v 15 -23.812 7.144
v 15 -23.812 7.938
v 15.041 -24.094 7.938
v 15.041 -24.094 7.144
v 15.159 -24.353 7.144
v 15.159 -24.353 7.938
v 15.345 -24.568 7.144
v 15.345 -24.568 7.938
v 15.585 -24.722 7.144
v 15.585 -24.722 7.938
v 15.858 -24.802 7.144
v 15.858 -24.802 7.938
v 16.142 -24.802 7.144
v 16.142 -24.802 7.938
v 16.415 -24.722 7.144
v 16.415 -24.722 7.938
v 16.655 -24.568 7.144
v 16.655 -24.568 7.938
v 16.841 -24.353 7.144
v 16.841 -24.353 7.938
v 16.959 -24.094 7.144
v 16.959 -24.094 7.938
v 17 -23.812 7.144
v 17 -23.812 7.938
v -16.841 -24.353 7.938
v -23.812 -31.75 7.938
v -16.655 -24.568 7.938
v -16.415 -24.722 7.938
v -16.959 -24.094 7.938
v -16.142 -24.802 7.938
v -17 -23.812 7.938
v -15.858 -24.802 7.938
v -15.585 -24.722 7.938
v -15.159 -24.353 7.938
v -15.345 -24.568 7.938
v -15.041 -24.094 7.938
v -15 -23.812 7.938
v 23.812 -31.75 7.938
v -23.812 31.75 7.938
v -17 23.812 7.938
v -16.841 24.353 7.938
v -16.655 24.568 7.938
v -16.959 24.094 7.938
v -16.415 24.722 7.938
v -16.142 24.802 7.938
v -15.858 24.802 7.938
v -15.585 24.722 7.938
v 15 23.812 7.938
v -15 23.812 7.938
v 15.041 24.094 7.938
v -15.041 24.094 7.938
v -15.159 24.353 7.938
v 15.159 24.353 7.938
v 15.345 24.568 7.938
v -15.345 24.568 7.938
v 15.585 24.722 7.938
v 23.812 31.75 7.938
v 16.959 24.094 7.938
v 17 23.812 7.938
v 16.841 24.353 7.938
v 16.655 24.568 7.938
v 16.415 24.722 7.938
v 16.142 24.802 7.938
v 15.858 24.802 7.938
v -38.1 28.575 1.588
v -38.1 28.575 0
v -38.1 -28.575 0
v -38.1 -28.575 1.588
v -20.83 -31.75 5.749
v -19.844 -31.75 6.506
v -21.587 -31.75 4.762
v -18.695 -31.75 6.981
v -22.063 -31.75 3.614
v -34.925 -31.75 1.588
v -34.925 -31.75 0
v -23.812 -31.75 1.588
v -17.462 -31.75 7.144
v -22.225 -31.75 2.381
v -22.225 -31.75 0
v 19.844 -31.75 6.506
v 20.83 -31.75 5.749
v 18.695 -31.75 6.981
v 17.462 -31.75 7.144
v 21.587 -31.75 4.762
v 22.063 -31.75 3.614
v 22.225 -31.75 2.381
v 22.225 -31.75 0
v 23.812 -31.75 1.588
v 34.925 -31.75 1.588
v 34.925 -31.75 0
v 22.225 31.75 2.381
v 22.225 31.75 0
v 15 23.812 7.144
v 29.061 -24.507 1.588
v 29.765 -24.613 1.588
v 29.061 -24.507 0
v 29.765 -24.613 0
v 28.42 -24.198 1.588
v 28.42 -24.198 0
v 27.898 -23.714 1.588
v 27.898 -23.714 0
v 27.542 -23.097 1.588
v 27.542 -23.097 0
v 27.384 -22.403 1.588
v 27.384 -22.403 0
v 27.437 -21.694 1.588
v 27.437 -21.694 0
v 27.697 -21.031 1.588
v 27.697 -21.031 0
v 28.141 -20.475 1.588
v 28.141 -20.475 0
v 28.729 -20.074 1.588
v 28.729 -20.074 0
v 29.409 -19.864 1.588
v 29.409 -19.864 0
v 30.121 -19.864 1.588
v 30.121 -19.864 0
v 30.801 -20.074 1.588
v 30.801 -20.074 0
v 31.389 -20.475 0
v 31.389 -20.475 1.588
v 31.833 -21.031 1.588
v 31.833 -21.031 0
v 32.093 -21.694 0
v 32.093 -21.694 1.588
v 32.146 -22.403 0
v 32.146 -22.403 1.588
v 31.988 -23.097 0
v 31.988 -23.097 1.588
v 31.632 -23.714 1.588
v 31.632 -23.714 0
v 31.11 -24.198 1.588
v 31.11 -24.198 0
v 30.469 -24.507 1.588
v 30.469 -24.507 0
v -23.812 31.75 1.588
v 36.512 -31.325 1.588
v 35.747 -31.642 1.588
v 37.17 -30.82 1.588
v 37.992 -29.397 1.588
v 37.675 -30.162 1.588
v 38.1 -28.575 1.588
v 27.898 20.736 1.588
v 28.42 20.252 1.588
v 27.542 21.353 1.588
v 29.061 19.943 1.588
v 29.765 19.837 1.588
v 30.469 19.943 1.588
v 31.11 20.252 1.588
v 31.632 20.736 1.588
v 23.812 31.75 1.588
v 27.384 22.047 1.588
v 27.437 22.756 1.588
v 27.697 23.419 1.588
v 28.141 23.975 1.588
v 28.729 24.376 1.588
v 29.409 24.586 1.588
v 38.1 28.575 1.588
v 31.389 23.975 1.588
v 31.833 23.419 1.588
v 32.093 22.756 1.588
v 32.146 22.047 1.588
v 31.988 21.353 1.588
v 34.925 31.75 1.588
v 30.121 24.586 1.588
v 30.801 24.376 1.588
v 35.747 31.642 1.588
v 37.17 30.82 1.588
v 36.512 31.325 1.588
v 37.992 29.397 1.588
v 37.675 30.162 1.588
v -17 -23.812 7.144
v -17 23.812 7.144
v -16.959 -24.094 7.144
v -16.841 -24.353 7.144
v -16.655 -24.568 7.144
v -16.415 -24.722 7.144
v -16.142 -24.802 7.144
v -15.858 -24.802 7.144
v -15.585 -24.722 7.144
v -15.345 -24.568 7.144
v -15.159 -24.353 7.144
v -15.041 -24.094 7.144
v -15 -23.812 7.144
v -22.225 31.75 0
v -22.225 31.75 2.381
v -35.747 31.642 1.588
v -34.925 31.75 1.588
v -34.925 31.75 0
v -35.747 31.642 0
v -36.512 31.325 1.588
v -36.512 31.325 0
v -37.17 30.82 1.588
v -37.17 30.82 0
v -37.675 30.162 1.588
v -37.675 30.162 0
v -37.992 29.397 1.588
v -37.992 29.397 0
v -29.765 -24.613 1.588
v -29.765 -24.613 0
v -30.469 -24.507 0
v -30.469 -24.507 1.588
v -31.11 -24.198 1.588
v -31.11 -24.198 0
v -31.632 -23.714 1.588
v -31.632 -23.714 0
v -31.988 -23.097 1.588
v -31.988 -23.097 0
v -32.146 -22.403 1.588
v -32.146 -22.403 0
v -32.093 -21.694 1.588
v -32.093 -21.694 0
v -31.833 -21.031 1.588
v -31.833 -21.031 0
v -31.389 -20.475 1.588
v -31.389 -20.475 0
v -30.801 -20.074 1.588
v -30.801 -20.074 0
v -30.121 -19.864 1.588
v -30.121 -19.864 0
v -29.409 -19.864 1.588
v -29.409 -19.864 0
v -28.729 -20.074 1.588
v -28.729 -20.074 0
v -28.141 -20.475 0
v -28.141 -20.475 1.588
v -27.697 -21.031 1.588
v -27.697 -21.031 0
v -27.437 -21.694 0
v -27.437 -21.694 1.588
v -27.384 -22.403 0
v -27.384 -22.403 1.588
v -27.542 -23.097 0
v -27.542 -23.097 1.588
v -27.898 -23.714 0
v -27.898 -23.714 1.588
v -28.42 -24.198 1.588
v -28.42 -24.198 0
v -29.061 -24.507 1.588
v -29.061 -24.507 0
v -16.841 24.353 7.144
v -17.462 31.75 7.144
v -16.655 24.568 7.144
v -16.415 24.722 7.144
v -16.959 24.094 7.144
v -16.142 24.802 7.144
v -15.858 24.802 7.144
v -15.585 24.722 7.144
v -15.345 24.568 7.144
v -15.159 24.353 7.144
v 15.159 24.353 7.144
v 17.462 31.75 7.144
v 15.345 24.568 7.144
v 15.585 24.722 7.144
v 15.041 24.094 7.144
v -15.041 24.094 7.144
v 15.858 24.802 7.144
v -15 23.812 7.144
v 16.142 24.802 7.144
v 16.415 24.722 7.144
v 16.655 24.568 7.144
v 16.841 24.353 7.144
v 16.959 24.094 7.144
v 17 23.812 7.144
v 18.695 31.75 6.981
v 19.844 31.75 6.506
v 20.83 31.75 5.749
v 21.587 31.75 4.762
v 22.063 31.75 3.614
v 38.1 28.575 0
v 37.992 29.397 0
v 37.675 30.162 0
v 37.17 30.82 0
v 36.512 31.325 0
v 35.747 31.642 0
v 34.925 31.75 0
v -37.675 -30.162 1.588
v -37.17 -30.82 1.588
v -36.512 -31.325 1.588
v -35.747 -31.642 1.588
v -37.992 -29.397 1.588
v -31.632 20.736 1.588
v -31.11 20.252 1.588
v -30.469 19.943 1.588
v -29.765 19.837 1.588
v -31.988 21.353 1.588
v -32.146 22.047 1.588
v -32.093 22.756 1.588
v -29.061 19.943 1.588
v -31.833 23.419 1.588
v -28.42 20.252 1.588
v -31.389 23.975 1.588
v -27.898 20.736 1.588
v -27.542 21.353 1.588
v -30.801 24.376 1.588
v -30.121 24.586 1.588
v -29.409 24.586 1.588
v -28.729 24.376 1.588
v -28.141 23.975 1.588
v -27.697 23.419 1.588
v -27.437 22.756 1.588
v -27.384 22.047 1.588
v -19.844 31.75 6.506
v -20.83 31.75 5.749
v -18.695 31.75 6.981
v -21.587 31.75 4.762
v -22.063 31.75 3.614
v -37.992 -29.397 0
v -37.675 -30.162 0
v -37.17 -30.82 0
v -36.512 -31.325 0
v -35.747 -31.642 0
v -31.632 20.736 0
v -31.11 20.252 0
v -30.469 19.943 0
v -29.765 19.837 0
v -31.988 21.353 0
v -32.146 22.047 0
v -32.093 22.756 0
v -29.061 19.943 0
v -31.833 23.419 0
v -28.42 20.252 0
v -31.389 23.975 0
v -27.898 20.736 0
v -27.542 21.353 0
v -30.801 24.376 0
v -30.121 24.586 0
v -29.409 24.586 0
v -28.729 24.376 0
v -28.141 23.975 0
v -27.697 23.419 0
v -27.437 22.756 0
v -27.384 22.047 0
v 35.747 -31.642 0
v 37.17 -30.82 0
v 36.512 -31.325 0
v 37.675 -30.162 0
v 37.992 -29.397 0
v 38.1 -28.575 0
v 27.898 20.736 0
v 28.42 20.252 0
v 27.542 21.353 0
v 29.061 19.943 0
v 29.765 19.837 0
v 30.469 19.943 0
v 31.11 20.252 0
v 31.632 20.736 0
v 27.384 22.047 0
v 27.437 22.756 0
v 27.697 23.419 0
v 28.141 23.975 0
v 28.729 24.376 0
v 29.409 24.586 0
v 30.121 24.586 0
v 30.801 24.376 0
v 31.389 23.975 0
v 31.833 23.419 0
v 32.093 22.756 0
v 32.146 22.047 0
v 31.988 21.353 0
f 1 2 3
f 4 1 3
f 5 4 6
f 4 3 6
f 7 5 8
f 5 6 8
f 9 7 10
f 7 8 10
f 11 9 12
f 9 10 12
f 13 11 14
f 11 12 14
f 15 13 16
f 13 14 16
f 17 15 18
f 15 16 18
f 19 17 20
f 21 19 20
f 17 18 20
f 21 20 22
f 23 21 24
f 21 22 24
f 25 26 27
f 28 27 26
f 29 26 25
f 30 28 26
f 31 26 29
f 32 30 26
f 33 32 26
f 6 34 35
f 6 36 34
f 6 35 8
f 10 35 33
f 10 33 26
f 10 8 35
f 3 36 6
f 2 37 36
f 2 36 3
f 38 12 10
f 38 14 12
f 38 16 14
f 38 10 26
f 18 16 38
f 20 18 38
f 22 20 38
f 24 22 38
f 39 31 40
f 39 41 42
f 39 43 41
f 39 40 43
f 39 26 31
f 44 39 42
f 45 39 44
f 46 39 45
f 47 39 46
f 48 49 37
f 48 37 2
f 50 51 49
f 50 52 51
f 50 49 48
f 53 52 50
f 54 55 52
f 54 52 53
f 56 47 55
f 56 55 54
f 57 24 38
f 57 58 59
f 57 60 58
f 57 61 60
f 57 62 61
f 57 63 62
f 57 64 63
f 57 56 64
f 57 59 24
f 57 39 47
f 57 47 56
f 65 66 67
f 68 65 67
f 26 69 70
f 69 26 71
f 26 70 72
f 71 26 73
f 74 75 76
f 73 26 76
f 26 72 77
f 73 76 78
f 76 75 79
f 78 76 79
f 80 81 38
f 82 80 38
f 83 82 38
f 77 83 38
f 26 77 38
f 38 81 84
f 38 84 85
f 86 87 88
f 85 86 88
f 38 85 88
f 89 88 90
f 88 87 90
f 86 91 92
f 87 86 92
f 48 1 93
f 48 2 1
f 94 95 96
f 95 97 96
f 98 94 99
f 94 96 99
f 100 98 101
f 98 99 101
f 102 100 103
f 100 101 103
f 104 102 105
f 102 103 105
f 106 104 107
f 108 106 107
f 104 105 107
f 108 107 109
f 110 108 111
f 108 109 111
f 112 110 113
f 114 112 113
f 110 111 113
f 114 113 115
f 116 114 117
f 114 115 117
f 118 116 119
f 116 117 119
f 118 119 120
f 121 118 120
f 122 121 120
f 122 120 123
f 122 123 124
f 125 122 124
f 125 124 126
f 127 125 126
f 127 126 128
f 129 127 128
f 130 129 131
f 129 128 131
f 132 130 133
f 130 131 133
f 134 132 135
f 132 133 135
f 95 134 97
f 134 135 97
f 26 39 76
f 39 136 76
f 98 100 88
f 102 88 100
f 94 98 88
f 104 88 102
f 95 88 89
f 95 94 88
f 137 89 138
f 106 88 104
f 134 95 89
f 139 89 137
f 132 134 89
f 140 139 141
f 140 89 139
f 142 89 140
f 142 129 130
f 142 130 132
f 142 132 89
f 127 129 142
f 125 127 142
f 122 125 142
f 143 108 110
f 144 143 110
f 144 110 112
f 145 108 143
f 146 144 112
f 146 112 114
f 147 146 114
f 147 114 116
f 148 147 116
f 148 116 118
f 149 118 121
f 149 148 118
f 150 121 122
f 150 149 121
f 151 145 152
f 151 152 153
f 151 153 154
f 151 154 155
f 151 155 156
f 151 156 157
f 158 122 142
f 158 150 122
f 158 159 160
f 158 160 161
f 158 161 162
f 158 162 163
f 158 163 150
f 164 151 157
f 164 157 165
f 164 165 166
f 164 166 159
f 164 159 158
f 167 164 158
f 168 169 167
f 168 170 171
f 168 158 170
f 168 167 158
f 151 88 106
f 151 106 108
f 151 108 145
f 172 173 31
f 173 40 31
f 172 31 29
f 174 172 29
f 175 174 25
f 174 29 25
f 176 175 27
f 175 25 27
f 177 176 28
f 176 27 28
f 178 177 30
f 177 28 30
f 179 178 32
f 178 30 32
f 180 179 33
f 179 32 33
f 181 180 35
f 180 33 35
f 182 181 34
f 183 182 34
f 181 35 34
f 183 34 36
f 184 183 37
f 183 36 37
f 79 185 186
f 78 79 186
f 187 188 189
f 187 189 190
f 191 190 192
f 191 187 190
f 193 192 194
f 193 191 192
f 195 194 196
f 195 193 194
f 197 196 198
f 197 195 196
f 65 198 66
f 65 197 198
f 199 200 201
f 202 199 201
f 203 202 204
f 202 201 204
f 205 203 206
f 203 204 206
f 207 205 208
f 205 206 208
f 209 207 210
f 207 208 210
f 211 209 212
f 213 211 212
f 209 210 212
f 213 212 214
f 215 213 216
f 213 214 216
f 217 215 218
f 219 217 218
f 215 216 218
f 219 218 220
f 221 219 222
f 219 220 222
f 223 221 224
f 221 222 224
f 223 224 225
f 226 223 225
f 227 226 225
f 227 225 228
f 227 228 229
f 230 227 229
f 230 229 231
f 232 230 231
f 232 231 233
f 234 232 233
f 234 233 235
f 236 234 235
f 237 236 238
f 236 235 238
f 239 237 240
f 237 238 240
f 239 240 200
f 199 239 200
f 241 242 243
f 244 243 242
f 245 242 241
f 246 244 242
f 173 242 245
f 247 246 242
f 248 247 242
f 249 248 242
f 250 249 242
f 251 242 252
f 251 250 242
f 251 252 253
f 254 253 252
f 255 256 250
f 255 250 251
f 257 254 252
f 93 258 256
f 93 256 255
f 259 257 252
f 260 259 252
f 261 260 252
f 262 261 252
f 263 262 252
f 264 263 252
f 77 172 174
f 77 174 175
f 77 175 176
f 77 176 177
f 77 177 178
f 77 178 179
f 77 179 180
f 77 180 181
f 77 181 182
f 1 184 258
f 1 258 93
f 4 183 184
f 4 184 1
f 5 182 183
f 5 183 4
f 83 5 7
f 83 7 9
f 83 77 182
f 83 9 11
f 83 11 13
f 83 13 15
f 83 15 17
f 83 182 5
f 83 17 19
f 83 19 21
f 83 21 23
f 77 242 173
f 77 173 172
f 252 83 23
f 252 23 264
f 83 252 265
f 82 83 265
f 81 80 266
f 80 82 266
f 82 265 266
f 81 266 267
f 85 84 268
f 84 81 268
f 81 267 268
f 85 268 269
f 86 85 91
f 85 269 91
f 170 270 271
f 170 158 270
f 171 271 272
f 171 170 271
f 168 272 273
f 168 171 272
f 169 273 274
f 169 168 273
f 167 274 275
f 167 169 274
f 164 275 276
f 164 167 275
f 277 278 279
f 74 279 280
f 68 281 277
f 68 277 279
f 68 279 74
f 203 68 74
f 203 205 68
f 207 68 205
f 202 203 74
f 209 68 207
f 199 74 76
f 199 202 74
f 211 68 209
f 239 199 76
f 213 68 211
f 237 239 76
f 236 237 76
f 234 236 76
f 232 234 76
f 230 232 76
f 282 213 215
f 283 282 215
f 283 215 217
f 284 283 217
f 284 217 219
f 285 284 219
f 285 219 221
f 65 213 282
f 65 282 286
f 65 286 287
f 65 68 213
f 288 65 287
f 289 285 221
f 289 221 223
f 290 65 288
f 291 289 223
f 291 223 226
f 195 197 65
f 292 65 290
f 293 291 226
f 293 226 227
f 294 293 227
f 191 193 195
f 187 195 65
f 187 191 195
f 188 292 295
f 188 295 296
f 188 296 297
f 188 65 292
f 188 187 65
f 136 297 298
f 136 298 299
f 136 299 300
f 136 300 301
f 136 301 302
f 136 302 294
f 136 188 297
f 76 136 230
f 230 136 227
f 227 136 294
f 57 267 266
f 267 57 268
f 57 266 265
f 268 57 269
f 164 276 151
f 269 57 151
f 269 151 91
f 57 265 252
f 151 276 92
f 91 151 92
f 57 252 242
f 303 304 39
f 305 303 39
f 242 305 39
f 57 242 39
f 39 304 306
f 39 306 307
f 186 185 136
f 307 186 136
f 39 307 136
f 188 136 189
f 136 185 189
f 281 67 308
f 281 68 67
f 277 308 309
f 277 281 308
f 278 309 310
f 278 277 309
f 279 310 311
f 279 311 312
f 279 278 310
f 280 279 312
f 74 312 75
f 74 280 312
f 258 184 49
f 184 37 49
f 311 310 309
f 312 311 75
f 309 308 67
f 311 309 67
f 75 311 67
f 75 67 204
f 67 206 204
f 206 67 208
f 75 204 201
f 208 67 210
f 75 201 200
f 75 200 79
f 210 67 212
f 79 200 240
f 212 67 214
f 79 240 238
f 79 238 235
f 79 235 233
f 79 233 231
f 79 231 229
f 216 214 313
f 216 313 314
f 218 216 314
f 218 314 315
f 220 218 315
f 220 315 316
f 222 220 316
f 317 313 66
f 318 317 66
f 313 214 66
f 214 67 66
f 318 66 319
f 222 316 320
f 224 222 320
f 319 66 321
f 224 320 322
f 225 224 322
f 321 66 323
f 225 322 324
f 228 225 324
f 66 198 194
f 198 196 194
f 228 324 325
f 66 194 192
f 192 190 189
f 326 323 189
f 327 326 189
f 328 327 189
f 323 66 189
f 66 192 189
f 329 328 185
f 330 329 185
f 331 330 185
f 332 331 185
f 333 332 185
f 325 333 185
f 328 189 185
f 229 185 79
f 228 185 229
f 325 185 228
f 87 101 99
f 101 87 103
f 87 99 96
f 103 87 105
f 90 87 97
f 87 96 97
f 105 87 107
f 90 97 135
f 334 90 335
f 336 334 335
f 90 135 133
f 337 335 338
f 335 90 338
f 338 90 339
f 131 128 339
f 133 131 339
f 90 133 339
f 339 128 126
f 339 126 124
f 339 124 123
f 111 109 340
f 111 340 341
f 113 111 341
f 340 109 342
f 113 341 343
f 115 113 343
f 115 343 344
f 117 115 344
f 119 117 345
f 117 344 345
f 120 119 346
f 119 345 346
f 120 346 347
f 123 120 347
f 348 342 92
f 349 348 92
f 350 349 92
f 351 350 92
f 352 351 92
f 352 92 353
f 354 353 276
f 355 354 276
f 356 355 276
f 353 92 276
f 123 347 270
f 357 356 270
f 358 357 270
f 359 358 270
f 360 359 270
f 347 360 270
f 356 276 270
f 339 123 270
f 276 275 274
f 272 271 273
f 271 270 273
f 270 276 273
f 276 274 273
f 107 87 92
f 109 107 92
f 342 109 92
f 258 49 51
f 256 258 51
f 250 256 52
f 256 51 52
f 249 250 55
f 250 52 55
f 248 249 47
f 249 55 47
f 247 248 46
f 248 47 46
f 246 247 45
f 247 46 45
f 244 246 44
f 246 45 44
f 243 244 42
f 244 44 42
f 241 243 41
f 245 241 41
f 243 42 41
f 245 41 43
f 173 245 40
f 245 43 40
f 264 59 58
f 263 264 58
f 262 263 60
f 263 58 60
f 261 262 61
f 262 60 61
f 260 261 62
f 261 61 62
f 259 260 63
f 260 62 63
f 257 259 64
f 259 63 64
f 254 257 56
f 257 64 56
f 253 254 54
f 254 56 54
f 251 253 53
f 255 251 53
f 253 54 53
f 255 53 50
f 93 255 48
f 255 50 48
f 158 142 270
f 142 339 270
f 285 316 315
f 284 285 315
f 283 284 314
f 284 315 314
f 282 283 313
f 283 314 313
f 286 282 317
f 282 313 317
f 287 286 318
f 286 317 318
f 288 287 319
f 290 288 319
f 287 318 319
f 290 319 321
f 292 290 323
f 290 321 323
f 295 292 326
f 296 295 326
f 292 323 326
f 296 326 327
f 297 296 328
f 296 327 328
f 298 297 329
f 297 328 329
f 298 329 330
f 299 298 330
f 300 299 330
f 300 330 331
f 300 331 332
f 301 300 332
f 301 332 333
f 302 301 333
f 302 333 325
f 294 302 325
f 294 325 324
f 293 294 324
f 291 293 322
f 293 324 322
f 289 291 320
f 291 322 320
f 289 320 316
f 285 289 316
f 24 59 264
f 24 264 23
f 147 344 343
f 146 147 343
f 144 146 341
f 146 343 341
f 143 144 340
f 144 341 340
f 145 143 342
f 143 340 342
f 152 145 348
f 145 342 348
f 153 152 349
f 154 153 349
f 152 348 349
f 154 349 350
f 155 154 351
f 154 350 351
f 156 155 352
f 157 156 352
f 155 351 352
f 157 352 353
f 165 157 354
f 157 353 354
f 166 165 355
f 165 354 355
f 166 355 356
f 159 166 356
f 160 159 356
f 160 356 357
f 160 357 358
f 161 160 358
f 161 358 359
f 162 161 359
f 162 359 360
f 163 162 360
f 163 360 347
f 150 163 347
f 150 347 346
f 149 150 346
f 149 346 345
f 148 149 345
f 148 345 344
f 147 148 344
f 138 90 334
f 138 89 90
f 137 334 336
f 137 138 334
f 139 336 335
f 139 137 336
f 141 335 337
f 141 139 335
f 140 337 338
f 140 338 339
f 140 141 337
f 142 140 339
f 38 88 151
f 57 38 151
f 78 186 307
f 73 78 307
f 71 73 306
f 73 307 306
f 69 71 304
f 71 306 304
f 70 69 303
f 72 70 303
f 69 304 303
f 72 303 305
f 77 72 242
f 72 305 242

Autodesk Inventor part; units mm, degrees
ref_plane "YZ Plane" through (0, 0, 0) normal (1, 0, 0) x (0, 1, 0)
ref_plane "XZ Plane" through (0, 0, 0) normal (0, 1, 0) x (-1, 0, 0)
ref_plane "XY Plane" through (0, 0, 0) normal (0, 0, 1) x (1, 0, 0)
sketch "Sketch1" plane through (0, 0, 0) normal (0, 0, 1) x (1, 0, 0)
  line L0 (-38.1, -31.75) -> (38.1, -31.75)
  line L1 (38.1, -31.75) -> (38.1, 31.75)
  line L2 (38.1, 31.75) -> (-38.1, 31.75)
  line L3 (-38.1, 31.75) -> (-38.1, -31.75)
  line L4 (-38.1, -31.75) -> (38.1, 31.75) construction
  line L5 (38.1, -31.75) -> (-38.1, 31.75) construction
  point P0 (0, 0)
  dimension "d0" = 76.2
  dimension "d1" = 63.5
extrude "Extrusion1" add sketch "Sketch1" along normal blind 1.5875
sketch "Sketch2" plane through (0, 0, 1.5875) normal (0, 0, 1) x (1, 0, 0)
  line L0 (0, -44.45) -> (0, 44.45) projected
  line L1 (-53.34, 0) -> (53.34, 0) projected
  line L2 (38.1, 31.75) -> (-38.1, 31.75) projected
  point P0 (0, 0)
  point P1 (-29.765, 22.225)
  point P2 (29.765, 22.225)
  point P3 (29.765, -22.225)
  point P4 (-29.765, -22.225)
  dimension "d4" = 59.53
  dimension "d5" = 9.525
hole "Hole1" at (-29.765, -22.225, 1.5875) at (-29.765, 22.225, 1.5875) at (29.765, 22.225, 1.5875) at (29.765, -22.225, 1.5875) direction (0, 0, -1) diameter 4.7752 end through all
sketch "Sketch4" plane through (0, 0, 1.5875) normal (0, 0, 1) x (1, 0, 0)
  line L0 (38.1, 31.75) -> (-38.1, 31.75) projected
  line L1 (-23.8125, -31.75) -> (23.8125, -31.75)
  line L2 (23.8125, -31.75) -> (23.8125, 31.75)
  line L3 (23.8125, 31.75) -> (-23.8125, 31.75)
  line L4 (-23.8125, 31.75) -> (-23.8125, -31.75)
  line L5 (-23.8125, -31.75) -> (23.8125, 31.75) construction
  line L6 (23.8125, -31.75) -> (-23.8125, 31.75) construction
  point P0 (0, 0)
  point P1 (-23.8125, 31.75)
  dimension "d13" = 47.625
extrude "Extrusion2" add sketch "Sketch4" along normal blind 6.35
sketch "Sketch5" plane through (-38.1, -31.75, 0) normal (0, -1, 0) x (1, 0, 0)
  line L0 (76.2, 0) -> (0, 0) projected
  line L1 (15.875, 7.1437) -> (60.325, 7.1437)
  line L2 (60.325, 7.1437) -> (60.325, 0)
  line L3 (60.325, 0) -> (15.875, 0)
  line L4 (15.875, 0) -> (15.875, 7.1437)
  line L5 (14.2875, 7.9375) -> (61.9125, 7.9375) projected
  line L6 (14.2875, 1.5875) -> (14.2875, 7.9375) projected
  line L7 (61.9125, 1.5875) -> (61.9125, 7.9375) projected
  point P0 (38.1, 0)
  dimension "d16" = 0.7937
  dimension "d17" = 1.5875
  dimension "d18" = 1.5875
extrude "Extrusion3" cut sketch "Sketch5" along normal through all both and the other way through all
sketch "Sketch6" plane through (0, 0, 7.9375) normal (0, 0, 1) x (1, 0, 0)
  line L0 (-16, -23.8125) -> (-16, 23.8125) construction
  line L1 (-15, -23.8125) -> (-15, 23.8125)
  line L2 (-17, 23.8125) -> (-17, -23.8125)
  arc A0 (-17, -23.8125) -> (-15, -23.8125) centre (-16, -23.8125) ccw
  arc A1 (-15, 23.8125) -> (-17, 23.8125) centre (-16, 23.8125) ccw
  line L3 (16, -23.8125) -> (16, 23.8125) construction
  line L4 (15, -23.8125) -> (15, 23.8125)
  line L5 (17, 23.8125) -> (17, -23.8125)
  arc A2 (15, -23.8125) -> (17, -23.8125) centre (16, -23.8125) ccw
  arc A3 (17, 23.8125) -> (15, 23.8125) centre (16, 23.8125) ccw
  line L6 (0, -44.45) -> (0, 44.45) projected
  line L7 (-53.34, 0) -> (53.34, 0) projected
  line L8 (23.8125, 31.75) -> (-23.8125, 31.75) projected
  point P0 (0, 0)
  point P1 (-16, 0)
  point P2 (16, 0)
  dimension "d21" = 32
  dimension "d22" = 2
  dimension "d23" = 7.9375
extrude "Extrusion4" cut sketch "Sketch6" against normal through all
fillet "Fillet1" radius 3.175 4 edges at (-38.1, 31.75, 0.7937) (-38.1, -31.75, 0.7937) (38.1, -31.75, 0.7937) (38.1, 31.75, 0.7937)
fillet "Fillet2" radius 4.7625 2 edges at (-22.225, 0, 7.1437) (22.225, 0, 7.1437)
properties part number "RC_CAR_LIDAR_PLATE"
